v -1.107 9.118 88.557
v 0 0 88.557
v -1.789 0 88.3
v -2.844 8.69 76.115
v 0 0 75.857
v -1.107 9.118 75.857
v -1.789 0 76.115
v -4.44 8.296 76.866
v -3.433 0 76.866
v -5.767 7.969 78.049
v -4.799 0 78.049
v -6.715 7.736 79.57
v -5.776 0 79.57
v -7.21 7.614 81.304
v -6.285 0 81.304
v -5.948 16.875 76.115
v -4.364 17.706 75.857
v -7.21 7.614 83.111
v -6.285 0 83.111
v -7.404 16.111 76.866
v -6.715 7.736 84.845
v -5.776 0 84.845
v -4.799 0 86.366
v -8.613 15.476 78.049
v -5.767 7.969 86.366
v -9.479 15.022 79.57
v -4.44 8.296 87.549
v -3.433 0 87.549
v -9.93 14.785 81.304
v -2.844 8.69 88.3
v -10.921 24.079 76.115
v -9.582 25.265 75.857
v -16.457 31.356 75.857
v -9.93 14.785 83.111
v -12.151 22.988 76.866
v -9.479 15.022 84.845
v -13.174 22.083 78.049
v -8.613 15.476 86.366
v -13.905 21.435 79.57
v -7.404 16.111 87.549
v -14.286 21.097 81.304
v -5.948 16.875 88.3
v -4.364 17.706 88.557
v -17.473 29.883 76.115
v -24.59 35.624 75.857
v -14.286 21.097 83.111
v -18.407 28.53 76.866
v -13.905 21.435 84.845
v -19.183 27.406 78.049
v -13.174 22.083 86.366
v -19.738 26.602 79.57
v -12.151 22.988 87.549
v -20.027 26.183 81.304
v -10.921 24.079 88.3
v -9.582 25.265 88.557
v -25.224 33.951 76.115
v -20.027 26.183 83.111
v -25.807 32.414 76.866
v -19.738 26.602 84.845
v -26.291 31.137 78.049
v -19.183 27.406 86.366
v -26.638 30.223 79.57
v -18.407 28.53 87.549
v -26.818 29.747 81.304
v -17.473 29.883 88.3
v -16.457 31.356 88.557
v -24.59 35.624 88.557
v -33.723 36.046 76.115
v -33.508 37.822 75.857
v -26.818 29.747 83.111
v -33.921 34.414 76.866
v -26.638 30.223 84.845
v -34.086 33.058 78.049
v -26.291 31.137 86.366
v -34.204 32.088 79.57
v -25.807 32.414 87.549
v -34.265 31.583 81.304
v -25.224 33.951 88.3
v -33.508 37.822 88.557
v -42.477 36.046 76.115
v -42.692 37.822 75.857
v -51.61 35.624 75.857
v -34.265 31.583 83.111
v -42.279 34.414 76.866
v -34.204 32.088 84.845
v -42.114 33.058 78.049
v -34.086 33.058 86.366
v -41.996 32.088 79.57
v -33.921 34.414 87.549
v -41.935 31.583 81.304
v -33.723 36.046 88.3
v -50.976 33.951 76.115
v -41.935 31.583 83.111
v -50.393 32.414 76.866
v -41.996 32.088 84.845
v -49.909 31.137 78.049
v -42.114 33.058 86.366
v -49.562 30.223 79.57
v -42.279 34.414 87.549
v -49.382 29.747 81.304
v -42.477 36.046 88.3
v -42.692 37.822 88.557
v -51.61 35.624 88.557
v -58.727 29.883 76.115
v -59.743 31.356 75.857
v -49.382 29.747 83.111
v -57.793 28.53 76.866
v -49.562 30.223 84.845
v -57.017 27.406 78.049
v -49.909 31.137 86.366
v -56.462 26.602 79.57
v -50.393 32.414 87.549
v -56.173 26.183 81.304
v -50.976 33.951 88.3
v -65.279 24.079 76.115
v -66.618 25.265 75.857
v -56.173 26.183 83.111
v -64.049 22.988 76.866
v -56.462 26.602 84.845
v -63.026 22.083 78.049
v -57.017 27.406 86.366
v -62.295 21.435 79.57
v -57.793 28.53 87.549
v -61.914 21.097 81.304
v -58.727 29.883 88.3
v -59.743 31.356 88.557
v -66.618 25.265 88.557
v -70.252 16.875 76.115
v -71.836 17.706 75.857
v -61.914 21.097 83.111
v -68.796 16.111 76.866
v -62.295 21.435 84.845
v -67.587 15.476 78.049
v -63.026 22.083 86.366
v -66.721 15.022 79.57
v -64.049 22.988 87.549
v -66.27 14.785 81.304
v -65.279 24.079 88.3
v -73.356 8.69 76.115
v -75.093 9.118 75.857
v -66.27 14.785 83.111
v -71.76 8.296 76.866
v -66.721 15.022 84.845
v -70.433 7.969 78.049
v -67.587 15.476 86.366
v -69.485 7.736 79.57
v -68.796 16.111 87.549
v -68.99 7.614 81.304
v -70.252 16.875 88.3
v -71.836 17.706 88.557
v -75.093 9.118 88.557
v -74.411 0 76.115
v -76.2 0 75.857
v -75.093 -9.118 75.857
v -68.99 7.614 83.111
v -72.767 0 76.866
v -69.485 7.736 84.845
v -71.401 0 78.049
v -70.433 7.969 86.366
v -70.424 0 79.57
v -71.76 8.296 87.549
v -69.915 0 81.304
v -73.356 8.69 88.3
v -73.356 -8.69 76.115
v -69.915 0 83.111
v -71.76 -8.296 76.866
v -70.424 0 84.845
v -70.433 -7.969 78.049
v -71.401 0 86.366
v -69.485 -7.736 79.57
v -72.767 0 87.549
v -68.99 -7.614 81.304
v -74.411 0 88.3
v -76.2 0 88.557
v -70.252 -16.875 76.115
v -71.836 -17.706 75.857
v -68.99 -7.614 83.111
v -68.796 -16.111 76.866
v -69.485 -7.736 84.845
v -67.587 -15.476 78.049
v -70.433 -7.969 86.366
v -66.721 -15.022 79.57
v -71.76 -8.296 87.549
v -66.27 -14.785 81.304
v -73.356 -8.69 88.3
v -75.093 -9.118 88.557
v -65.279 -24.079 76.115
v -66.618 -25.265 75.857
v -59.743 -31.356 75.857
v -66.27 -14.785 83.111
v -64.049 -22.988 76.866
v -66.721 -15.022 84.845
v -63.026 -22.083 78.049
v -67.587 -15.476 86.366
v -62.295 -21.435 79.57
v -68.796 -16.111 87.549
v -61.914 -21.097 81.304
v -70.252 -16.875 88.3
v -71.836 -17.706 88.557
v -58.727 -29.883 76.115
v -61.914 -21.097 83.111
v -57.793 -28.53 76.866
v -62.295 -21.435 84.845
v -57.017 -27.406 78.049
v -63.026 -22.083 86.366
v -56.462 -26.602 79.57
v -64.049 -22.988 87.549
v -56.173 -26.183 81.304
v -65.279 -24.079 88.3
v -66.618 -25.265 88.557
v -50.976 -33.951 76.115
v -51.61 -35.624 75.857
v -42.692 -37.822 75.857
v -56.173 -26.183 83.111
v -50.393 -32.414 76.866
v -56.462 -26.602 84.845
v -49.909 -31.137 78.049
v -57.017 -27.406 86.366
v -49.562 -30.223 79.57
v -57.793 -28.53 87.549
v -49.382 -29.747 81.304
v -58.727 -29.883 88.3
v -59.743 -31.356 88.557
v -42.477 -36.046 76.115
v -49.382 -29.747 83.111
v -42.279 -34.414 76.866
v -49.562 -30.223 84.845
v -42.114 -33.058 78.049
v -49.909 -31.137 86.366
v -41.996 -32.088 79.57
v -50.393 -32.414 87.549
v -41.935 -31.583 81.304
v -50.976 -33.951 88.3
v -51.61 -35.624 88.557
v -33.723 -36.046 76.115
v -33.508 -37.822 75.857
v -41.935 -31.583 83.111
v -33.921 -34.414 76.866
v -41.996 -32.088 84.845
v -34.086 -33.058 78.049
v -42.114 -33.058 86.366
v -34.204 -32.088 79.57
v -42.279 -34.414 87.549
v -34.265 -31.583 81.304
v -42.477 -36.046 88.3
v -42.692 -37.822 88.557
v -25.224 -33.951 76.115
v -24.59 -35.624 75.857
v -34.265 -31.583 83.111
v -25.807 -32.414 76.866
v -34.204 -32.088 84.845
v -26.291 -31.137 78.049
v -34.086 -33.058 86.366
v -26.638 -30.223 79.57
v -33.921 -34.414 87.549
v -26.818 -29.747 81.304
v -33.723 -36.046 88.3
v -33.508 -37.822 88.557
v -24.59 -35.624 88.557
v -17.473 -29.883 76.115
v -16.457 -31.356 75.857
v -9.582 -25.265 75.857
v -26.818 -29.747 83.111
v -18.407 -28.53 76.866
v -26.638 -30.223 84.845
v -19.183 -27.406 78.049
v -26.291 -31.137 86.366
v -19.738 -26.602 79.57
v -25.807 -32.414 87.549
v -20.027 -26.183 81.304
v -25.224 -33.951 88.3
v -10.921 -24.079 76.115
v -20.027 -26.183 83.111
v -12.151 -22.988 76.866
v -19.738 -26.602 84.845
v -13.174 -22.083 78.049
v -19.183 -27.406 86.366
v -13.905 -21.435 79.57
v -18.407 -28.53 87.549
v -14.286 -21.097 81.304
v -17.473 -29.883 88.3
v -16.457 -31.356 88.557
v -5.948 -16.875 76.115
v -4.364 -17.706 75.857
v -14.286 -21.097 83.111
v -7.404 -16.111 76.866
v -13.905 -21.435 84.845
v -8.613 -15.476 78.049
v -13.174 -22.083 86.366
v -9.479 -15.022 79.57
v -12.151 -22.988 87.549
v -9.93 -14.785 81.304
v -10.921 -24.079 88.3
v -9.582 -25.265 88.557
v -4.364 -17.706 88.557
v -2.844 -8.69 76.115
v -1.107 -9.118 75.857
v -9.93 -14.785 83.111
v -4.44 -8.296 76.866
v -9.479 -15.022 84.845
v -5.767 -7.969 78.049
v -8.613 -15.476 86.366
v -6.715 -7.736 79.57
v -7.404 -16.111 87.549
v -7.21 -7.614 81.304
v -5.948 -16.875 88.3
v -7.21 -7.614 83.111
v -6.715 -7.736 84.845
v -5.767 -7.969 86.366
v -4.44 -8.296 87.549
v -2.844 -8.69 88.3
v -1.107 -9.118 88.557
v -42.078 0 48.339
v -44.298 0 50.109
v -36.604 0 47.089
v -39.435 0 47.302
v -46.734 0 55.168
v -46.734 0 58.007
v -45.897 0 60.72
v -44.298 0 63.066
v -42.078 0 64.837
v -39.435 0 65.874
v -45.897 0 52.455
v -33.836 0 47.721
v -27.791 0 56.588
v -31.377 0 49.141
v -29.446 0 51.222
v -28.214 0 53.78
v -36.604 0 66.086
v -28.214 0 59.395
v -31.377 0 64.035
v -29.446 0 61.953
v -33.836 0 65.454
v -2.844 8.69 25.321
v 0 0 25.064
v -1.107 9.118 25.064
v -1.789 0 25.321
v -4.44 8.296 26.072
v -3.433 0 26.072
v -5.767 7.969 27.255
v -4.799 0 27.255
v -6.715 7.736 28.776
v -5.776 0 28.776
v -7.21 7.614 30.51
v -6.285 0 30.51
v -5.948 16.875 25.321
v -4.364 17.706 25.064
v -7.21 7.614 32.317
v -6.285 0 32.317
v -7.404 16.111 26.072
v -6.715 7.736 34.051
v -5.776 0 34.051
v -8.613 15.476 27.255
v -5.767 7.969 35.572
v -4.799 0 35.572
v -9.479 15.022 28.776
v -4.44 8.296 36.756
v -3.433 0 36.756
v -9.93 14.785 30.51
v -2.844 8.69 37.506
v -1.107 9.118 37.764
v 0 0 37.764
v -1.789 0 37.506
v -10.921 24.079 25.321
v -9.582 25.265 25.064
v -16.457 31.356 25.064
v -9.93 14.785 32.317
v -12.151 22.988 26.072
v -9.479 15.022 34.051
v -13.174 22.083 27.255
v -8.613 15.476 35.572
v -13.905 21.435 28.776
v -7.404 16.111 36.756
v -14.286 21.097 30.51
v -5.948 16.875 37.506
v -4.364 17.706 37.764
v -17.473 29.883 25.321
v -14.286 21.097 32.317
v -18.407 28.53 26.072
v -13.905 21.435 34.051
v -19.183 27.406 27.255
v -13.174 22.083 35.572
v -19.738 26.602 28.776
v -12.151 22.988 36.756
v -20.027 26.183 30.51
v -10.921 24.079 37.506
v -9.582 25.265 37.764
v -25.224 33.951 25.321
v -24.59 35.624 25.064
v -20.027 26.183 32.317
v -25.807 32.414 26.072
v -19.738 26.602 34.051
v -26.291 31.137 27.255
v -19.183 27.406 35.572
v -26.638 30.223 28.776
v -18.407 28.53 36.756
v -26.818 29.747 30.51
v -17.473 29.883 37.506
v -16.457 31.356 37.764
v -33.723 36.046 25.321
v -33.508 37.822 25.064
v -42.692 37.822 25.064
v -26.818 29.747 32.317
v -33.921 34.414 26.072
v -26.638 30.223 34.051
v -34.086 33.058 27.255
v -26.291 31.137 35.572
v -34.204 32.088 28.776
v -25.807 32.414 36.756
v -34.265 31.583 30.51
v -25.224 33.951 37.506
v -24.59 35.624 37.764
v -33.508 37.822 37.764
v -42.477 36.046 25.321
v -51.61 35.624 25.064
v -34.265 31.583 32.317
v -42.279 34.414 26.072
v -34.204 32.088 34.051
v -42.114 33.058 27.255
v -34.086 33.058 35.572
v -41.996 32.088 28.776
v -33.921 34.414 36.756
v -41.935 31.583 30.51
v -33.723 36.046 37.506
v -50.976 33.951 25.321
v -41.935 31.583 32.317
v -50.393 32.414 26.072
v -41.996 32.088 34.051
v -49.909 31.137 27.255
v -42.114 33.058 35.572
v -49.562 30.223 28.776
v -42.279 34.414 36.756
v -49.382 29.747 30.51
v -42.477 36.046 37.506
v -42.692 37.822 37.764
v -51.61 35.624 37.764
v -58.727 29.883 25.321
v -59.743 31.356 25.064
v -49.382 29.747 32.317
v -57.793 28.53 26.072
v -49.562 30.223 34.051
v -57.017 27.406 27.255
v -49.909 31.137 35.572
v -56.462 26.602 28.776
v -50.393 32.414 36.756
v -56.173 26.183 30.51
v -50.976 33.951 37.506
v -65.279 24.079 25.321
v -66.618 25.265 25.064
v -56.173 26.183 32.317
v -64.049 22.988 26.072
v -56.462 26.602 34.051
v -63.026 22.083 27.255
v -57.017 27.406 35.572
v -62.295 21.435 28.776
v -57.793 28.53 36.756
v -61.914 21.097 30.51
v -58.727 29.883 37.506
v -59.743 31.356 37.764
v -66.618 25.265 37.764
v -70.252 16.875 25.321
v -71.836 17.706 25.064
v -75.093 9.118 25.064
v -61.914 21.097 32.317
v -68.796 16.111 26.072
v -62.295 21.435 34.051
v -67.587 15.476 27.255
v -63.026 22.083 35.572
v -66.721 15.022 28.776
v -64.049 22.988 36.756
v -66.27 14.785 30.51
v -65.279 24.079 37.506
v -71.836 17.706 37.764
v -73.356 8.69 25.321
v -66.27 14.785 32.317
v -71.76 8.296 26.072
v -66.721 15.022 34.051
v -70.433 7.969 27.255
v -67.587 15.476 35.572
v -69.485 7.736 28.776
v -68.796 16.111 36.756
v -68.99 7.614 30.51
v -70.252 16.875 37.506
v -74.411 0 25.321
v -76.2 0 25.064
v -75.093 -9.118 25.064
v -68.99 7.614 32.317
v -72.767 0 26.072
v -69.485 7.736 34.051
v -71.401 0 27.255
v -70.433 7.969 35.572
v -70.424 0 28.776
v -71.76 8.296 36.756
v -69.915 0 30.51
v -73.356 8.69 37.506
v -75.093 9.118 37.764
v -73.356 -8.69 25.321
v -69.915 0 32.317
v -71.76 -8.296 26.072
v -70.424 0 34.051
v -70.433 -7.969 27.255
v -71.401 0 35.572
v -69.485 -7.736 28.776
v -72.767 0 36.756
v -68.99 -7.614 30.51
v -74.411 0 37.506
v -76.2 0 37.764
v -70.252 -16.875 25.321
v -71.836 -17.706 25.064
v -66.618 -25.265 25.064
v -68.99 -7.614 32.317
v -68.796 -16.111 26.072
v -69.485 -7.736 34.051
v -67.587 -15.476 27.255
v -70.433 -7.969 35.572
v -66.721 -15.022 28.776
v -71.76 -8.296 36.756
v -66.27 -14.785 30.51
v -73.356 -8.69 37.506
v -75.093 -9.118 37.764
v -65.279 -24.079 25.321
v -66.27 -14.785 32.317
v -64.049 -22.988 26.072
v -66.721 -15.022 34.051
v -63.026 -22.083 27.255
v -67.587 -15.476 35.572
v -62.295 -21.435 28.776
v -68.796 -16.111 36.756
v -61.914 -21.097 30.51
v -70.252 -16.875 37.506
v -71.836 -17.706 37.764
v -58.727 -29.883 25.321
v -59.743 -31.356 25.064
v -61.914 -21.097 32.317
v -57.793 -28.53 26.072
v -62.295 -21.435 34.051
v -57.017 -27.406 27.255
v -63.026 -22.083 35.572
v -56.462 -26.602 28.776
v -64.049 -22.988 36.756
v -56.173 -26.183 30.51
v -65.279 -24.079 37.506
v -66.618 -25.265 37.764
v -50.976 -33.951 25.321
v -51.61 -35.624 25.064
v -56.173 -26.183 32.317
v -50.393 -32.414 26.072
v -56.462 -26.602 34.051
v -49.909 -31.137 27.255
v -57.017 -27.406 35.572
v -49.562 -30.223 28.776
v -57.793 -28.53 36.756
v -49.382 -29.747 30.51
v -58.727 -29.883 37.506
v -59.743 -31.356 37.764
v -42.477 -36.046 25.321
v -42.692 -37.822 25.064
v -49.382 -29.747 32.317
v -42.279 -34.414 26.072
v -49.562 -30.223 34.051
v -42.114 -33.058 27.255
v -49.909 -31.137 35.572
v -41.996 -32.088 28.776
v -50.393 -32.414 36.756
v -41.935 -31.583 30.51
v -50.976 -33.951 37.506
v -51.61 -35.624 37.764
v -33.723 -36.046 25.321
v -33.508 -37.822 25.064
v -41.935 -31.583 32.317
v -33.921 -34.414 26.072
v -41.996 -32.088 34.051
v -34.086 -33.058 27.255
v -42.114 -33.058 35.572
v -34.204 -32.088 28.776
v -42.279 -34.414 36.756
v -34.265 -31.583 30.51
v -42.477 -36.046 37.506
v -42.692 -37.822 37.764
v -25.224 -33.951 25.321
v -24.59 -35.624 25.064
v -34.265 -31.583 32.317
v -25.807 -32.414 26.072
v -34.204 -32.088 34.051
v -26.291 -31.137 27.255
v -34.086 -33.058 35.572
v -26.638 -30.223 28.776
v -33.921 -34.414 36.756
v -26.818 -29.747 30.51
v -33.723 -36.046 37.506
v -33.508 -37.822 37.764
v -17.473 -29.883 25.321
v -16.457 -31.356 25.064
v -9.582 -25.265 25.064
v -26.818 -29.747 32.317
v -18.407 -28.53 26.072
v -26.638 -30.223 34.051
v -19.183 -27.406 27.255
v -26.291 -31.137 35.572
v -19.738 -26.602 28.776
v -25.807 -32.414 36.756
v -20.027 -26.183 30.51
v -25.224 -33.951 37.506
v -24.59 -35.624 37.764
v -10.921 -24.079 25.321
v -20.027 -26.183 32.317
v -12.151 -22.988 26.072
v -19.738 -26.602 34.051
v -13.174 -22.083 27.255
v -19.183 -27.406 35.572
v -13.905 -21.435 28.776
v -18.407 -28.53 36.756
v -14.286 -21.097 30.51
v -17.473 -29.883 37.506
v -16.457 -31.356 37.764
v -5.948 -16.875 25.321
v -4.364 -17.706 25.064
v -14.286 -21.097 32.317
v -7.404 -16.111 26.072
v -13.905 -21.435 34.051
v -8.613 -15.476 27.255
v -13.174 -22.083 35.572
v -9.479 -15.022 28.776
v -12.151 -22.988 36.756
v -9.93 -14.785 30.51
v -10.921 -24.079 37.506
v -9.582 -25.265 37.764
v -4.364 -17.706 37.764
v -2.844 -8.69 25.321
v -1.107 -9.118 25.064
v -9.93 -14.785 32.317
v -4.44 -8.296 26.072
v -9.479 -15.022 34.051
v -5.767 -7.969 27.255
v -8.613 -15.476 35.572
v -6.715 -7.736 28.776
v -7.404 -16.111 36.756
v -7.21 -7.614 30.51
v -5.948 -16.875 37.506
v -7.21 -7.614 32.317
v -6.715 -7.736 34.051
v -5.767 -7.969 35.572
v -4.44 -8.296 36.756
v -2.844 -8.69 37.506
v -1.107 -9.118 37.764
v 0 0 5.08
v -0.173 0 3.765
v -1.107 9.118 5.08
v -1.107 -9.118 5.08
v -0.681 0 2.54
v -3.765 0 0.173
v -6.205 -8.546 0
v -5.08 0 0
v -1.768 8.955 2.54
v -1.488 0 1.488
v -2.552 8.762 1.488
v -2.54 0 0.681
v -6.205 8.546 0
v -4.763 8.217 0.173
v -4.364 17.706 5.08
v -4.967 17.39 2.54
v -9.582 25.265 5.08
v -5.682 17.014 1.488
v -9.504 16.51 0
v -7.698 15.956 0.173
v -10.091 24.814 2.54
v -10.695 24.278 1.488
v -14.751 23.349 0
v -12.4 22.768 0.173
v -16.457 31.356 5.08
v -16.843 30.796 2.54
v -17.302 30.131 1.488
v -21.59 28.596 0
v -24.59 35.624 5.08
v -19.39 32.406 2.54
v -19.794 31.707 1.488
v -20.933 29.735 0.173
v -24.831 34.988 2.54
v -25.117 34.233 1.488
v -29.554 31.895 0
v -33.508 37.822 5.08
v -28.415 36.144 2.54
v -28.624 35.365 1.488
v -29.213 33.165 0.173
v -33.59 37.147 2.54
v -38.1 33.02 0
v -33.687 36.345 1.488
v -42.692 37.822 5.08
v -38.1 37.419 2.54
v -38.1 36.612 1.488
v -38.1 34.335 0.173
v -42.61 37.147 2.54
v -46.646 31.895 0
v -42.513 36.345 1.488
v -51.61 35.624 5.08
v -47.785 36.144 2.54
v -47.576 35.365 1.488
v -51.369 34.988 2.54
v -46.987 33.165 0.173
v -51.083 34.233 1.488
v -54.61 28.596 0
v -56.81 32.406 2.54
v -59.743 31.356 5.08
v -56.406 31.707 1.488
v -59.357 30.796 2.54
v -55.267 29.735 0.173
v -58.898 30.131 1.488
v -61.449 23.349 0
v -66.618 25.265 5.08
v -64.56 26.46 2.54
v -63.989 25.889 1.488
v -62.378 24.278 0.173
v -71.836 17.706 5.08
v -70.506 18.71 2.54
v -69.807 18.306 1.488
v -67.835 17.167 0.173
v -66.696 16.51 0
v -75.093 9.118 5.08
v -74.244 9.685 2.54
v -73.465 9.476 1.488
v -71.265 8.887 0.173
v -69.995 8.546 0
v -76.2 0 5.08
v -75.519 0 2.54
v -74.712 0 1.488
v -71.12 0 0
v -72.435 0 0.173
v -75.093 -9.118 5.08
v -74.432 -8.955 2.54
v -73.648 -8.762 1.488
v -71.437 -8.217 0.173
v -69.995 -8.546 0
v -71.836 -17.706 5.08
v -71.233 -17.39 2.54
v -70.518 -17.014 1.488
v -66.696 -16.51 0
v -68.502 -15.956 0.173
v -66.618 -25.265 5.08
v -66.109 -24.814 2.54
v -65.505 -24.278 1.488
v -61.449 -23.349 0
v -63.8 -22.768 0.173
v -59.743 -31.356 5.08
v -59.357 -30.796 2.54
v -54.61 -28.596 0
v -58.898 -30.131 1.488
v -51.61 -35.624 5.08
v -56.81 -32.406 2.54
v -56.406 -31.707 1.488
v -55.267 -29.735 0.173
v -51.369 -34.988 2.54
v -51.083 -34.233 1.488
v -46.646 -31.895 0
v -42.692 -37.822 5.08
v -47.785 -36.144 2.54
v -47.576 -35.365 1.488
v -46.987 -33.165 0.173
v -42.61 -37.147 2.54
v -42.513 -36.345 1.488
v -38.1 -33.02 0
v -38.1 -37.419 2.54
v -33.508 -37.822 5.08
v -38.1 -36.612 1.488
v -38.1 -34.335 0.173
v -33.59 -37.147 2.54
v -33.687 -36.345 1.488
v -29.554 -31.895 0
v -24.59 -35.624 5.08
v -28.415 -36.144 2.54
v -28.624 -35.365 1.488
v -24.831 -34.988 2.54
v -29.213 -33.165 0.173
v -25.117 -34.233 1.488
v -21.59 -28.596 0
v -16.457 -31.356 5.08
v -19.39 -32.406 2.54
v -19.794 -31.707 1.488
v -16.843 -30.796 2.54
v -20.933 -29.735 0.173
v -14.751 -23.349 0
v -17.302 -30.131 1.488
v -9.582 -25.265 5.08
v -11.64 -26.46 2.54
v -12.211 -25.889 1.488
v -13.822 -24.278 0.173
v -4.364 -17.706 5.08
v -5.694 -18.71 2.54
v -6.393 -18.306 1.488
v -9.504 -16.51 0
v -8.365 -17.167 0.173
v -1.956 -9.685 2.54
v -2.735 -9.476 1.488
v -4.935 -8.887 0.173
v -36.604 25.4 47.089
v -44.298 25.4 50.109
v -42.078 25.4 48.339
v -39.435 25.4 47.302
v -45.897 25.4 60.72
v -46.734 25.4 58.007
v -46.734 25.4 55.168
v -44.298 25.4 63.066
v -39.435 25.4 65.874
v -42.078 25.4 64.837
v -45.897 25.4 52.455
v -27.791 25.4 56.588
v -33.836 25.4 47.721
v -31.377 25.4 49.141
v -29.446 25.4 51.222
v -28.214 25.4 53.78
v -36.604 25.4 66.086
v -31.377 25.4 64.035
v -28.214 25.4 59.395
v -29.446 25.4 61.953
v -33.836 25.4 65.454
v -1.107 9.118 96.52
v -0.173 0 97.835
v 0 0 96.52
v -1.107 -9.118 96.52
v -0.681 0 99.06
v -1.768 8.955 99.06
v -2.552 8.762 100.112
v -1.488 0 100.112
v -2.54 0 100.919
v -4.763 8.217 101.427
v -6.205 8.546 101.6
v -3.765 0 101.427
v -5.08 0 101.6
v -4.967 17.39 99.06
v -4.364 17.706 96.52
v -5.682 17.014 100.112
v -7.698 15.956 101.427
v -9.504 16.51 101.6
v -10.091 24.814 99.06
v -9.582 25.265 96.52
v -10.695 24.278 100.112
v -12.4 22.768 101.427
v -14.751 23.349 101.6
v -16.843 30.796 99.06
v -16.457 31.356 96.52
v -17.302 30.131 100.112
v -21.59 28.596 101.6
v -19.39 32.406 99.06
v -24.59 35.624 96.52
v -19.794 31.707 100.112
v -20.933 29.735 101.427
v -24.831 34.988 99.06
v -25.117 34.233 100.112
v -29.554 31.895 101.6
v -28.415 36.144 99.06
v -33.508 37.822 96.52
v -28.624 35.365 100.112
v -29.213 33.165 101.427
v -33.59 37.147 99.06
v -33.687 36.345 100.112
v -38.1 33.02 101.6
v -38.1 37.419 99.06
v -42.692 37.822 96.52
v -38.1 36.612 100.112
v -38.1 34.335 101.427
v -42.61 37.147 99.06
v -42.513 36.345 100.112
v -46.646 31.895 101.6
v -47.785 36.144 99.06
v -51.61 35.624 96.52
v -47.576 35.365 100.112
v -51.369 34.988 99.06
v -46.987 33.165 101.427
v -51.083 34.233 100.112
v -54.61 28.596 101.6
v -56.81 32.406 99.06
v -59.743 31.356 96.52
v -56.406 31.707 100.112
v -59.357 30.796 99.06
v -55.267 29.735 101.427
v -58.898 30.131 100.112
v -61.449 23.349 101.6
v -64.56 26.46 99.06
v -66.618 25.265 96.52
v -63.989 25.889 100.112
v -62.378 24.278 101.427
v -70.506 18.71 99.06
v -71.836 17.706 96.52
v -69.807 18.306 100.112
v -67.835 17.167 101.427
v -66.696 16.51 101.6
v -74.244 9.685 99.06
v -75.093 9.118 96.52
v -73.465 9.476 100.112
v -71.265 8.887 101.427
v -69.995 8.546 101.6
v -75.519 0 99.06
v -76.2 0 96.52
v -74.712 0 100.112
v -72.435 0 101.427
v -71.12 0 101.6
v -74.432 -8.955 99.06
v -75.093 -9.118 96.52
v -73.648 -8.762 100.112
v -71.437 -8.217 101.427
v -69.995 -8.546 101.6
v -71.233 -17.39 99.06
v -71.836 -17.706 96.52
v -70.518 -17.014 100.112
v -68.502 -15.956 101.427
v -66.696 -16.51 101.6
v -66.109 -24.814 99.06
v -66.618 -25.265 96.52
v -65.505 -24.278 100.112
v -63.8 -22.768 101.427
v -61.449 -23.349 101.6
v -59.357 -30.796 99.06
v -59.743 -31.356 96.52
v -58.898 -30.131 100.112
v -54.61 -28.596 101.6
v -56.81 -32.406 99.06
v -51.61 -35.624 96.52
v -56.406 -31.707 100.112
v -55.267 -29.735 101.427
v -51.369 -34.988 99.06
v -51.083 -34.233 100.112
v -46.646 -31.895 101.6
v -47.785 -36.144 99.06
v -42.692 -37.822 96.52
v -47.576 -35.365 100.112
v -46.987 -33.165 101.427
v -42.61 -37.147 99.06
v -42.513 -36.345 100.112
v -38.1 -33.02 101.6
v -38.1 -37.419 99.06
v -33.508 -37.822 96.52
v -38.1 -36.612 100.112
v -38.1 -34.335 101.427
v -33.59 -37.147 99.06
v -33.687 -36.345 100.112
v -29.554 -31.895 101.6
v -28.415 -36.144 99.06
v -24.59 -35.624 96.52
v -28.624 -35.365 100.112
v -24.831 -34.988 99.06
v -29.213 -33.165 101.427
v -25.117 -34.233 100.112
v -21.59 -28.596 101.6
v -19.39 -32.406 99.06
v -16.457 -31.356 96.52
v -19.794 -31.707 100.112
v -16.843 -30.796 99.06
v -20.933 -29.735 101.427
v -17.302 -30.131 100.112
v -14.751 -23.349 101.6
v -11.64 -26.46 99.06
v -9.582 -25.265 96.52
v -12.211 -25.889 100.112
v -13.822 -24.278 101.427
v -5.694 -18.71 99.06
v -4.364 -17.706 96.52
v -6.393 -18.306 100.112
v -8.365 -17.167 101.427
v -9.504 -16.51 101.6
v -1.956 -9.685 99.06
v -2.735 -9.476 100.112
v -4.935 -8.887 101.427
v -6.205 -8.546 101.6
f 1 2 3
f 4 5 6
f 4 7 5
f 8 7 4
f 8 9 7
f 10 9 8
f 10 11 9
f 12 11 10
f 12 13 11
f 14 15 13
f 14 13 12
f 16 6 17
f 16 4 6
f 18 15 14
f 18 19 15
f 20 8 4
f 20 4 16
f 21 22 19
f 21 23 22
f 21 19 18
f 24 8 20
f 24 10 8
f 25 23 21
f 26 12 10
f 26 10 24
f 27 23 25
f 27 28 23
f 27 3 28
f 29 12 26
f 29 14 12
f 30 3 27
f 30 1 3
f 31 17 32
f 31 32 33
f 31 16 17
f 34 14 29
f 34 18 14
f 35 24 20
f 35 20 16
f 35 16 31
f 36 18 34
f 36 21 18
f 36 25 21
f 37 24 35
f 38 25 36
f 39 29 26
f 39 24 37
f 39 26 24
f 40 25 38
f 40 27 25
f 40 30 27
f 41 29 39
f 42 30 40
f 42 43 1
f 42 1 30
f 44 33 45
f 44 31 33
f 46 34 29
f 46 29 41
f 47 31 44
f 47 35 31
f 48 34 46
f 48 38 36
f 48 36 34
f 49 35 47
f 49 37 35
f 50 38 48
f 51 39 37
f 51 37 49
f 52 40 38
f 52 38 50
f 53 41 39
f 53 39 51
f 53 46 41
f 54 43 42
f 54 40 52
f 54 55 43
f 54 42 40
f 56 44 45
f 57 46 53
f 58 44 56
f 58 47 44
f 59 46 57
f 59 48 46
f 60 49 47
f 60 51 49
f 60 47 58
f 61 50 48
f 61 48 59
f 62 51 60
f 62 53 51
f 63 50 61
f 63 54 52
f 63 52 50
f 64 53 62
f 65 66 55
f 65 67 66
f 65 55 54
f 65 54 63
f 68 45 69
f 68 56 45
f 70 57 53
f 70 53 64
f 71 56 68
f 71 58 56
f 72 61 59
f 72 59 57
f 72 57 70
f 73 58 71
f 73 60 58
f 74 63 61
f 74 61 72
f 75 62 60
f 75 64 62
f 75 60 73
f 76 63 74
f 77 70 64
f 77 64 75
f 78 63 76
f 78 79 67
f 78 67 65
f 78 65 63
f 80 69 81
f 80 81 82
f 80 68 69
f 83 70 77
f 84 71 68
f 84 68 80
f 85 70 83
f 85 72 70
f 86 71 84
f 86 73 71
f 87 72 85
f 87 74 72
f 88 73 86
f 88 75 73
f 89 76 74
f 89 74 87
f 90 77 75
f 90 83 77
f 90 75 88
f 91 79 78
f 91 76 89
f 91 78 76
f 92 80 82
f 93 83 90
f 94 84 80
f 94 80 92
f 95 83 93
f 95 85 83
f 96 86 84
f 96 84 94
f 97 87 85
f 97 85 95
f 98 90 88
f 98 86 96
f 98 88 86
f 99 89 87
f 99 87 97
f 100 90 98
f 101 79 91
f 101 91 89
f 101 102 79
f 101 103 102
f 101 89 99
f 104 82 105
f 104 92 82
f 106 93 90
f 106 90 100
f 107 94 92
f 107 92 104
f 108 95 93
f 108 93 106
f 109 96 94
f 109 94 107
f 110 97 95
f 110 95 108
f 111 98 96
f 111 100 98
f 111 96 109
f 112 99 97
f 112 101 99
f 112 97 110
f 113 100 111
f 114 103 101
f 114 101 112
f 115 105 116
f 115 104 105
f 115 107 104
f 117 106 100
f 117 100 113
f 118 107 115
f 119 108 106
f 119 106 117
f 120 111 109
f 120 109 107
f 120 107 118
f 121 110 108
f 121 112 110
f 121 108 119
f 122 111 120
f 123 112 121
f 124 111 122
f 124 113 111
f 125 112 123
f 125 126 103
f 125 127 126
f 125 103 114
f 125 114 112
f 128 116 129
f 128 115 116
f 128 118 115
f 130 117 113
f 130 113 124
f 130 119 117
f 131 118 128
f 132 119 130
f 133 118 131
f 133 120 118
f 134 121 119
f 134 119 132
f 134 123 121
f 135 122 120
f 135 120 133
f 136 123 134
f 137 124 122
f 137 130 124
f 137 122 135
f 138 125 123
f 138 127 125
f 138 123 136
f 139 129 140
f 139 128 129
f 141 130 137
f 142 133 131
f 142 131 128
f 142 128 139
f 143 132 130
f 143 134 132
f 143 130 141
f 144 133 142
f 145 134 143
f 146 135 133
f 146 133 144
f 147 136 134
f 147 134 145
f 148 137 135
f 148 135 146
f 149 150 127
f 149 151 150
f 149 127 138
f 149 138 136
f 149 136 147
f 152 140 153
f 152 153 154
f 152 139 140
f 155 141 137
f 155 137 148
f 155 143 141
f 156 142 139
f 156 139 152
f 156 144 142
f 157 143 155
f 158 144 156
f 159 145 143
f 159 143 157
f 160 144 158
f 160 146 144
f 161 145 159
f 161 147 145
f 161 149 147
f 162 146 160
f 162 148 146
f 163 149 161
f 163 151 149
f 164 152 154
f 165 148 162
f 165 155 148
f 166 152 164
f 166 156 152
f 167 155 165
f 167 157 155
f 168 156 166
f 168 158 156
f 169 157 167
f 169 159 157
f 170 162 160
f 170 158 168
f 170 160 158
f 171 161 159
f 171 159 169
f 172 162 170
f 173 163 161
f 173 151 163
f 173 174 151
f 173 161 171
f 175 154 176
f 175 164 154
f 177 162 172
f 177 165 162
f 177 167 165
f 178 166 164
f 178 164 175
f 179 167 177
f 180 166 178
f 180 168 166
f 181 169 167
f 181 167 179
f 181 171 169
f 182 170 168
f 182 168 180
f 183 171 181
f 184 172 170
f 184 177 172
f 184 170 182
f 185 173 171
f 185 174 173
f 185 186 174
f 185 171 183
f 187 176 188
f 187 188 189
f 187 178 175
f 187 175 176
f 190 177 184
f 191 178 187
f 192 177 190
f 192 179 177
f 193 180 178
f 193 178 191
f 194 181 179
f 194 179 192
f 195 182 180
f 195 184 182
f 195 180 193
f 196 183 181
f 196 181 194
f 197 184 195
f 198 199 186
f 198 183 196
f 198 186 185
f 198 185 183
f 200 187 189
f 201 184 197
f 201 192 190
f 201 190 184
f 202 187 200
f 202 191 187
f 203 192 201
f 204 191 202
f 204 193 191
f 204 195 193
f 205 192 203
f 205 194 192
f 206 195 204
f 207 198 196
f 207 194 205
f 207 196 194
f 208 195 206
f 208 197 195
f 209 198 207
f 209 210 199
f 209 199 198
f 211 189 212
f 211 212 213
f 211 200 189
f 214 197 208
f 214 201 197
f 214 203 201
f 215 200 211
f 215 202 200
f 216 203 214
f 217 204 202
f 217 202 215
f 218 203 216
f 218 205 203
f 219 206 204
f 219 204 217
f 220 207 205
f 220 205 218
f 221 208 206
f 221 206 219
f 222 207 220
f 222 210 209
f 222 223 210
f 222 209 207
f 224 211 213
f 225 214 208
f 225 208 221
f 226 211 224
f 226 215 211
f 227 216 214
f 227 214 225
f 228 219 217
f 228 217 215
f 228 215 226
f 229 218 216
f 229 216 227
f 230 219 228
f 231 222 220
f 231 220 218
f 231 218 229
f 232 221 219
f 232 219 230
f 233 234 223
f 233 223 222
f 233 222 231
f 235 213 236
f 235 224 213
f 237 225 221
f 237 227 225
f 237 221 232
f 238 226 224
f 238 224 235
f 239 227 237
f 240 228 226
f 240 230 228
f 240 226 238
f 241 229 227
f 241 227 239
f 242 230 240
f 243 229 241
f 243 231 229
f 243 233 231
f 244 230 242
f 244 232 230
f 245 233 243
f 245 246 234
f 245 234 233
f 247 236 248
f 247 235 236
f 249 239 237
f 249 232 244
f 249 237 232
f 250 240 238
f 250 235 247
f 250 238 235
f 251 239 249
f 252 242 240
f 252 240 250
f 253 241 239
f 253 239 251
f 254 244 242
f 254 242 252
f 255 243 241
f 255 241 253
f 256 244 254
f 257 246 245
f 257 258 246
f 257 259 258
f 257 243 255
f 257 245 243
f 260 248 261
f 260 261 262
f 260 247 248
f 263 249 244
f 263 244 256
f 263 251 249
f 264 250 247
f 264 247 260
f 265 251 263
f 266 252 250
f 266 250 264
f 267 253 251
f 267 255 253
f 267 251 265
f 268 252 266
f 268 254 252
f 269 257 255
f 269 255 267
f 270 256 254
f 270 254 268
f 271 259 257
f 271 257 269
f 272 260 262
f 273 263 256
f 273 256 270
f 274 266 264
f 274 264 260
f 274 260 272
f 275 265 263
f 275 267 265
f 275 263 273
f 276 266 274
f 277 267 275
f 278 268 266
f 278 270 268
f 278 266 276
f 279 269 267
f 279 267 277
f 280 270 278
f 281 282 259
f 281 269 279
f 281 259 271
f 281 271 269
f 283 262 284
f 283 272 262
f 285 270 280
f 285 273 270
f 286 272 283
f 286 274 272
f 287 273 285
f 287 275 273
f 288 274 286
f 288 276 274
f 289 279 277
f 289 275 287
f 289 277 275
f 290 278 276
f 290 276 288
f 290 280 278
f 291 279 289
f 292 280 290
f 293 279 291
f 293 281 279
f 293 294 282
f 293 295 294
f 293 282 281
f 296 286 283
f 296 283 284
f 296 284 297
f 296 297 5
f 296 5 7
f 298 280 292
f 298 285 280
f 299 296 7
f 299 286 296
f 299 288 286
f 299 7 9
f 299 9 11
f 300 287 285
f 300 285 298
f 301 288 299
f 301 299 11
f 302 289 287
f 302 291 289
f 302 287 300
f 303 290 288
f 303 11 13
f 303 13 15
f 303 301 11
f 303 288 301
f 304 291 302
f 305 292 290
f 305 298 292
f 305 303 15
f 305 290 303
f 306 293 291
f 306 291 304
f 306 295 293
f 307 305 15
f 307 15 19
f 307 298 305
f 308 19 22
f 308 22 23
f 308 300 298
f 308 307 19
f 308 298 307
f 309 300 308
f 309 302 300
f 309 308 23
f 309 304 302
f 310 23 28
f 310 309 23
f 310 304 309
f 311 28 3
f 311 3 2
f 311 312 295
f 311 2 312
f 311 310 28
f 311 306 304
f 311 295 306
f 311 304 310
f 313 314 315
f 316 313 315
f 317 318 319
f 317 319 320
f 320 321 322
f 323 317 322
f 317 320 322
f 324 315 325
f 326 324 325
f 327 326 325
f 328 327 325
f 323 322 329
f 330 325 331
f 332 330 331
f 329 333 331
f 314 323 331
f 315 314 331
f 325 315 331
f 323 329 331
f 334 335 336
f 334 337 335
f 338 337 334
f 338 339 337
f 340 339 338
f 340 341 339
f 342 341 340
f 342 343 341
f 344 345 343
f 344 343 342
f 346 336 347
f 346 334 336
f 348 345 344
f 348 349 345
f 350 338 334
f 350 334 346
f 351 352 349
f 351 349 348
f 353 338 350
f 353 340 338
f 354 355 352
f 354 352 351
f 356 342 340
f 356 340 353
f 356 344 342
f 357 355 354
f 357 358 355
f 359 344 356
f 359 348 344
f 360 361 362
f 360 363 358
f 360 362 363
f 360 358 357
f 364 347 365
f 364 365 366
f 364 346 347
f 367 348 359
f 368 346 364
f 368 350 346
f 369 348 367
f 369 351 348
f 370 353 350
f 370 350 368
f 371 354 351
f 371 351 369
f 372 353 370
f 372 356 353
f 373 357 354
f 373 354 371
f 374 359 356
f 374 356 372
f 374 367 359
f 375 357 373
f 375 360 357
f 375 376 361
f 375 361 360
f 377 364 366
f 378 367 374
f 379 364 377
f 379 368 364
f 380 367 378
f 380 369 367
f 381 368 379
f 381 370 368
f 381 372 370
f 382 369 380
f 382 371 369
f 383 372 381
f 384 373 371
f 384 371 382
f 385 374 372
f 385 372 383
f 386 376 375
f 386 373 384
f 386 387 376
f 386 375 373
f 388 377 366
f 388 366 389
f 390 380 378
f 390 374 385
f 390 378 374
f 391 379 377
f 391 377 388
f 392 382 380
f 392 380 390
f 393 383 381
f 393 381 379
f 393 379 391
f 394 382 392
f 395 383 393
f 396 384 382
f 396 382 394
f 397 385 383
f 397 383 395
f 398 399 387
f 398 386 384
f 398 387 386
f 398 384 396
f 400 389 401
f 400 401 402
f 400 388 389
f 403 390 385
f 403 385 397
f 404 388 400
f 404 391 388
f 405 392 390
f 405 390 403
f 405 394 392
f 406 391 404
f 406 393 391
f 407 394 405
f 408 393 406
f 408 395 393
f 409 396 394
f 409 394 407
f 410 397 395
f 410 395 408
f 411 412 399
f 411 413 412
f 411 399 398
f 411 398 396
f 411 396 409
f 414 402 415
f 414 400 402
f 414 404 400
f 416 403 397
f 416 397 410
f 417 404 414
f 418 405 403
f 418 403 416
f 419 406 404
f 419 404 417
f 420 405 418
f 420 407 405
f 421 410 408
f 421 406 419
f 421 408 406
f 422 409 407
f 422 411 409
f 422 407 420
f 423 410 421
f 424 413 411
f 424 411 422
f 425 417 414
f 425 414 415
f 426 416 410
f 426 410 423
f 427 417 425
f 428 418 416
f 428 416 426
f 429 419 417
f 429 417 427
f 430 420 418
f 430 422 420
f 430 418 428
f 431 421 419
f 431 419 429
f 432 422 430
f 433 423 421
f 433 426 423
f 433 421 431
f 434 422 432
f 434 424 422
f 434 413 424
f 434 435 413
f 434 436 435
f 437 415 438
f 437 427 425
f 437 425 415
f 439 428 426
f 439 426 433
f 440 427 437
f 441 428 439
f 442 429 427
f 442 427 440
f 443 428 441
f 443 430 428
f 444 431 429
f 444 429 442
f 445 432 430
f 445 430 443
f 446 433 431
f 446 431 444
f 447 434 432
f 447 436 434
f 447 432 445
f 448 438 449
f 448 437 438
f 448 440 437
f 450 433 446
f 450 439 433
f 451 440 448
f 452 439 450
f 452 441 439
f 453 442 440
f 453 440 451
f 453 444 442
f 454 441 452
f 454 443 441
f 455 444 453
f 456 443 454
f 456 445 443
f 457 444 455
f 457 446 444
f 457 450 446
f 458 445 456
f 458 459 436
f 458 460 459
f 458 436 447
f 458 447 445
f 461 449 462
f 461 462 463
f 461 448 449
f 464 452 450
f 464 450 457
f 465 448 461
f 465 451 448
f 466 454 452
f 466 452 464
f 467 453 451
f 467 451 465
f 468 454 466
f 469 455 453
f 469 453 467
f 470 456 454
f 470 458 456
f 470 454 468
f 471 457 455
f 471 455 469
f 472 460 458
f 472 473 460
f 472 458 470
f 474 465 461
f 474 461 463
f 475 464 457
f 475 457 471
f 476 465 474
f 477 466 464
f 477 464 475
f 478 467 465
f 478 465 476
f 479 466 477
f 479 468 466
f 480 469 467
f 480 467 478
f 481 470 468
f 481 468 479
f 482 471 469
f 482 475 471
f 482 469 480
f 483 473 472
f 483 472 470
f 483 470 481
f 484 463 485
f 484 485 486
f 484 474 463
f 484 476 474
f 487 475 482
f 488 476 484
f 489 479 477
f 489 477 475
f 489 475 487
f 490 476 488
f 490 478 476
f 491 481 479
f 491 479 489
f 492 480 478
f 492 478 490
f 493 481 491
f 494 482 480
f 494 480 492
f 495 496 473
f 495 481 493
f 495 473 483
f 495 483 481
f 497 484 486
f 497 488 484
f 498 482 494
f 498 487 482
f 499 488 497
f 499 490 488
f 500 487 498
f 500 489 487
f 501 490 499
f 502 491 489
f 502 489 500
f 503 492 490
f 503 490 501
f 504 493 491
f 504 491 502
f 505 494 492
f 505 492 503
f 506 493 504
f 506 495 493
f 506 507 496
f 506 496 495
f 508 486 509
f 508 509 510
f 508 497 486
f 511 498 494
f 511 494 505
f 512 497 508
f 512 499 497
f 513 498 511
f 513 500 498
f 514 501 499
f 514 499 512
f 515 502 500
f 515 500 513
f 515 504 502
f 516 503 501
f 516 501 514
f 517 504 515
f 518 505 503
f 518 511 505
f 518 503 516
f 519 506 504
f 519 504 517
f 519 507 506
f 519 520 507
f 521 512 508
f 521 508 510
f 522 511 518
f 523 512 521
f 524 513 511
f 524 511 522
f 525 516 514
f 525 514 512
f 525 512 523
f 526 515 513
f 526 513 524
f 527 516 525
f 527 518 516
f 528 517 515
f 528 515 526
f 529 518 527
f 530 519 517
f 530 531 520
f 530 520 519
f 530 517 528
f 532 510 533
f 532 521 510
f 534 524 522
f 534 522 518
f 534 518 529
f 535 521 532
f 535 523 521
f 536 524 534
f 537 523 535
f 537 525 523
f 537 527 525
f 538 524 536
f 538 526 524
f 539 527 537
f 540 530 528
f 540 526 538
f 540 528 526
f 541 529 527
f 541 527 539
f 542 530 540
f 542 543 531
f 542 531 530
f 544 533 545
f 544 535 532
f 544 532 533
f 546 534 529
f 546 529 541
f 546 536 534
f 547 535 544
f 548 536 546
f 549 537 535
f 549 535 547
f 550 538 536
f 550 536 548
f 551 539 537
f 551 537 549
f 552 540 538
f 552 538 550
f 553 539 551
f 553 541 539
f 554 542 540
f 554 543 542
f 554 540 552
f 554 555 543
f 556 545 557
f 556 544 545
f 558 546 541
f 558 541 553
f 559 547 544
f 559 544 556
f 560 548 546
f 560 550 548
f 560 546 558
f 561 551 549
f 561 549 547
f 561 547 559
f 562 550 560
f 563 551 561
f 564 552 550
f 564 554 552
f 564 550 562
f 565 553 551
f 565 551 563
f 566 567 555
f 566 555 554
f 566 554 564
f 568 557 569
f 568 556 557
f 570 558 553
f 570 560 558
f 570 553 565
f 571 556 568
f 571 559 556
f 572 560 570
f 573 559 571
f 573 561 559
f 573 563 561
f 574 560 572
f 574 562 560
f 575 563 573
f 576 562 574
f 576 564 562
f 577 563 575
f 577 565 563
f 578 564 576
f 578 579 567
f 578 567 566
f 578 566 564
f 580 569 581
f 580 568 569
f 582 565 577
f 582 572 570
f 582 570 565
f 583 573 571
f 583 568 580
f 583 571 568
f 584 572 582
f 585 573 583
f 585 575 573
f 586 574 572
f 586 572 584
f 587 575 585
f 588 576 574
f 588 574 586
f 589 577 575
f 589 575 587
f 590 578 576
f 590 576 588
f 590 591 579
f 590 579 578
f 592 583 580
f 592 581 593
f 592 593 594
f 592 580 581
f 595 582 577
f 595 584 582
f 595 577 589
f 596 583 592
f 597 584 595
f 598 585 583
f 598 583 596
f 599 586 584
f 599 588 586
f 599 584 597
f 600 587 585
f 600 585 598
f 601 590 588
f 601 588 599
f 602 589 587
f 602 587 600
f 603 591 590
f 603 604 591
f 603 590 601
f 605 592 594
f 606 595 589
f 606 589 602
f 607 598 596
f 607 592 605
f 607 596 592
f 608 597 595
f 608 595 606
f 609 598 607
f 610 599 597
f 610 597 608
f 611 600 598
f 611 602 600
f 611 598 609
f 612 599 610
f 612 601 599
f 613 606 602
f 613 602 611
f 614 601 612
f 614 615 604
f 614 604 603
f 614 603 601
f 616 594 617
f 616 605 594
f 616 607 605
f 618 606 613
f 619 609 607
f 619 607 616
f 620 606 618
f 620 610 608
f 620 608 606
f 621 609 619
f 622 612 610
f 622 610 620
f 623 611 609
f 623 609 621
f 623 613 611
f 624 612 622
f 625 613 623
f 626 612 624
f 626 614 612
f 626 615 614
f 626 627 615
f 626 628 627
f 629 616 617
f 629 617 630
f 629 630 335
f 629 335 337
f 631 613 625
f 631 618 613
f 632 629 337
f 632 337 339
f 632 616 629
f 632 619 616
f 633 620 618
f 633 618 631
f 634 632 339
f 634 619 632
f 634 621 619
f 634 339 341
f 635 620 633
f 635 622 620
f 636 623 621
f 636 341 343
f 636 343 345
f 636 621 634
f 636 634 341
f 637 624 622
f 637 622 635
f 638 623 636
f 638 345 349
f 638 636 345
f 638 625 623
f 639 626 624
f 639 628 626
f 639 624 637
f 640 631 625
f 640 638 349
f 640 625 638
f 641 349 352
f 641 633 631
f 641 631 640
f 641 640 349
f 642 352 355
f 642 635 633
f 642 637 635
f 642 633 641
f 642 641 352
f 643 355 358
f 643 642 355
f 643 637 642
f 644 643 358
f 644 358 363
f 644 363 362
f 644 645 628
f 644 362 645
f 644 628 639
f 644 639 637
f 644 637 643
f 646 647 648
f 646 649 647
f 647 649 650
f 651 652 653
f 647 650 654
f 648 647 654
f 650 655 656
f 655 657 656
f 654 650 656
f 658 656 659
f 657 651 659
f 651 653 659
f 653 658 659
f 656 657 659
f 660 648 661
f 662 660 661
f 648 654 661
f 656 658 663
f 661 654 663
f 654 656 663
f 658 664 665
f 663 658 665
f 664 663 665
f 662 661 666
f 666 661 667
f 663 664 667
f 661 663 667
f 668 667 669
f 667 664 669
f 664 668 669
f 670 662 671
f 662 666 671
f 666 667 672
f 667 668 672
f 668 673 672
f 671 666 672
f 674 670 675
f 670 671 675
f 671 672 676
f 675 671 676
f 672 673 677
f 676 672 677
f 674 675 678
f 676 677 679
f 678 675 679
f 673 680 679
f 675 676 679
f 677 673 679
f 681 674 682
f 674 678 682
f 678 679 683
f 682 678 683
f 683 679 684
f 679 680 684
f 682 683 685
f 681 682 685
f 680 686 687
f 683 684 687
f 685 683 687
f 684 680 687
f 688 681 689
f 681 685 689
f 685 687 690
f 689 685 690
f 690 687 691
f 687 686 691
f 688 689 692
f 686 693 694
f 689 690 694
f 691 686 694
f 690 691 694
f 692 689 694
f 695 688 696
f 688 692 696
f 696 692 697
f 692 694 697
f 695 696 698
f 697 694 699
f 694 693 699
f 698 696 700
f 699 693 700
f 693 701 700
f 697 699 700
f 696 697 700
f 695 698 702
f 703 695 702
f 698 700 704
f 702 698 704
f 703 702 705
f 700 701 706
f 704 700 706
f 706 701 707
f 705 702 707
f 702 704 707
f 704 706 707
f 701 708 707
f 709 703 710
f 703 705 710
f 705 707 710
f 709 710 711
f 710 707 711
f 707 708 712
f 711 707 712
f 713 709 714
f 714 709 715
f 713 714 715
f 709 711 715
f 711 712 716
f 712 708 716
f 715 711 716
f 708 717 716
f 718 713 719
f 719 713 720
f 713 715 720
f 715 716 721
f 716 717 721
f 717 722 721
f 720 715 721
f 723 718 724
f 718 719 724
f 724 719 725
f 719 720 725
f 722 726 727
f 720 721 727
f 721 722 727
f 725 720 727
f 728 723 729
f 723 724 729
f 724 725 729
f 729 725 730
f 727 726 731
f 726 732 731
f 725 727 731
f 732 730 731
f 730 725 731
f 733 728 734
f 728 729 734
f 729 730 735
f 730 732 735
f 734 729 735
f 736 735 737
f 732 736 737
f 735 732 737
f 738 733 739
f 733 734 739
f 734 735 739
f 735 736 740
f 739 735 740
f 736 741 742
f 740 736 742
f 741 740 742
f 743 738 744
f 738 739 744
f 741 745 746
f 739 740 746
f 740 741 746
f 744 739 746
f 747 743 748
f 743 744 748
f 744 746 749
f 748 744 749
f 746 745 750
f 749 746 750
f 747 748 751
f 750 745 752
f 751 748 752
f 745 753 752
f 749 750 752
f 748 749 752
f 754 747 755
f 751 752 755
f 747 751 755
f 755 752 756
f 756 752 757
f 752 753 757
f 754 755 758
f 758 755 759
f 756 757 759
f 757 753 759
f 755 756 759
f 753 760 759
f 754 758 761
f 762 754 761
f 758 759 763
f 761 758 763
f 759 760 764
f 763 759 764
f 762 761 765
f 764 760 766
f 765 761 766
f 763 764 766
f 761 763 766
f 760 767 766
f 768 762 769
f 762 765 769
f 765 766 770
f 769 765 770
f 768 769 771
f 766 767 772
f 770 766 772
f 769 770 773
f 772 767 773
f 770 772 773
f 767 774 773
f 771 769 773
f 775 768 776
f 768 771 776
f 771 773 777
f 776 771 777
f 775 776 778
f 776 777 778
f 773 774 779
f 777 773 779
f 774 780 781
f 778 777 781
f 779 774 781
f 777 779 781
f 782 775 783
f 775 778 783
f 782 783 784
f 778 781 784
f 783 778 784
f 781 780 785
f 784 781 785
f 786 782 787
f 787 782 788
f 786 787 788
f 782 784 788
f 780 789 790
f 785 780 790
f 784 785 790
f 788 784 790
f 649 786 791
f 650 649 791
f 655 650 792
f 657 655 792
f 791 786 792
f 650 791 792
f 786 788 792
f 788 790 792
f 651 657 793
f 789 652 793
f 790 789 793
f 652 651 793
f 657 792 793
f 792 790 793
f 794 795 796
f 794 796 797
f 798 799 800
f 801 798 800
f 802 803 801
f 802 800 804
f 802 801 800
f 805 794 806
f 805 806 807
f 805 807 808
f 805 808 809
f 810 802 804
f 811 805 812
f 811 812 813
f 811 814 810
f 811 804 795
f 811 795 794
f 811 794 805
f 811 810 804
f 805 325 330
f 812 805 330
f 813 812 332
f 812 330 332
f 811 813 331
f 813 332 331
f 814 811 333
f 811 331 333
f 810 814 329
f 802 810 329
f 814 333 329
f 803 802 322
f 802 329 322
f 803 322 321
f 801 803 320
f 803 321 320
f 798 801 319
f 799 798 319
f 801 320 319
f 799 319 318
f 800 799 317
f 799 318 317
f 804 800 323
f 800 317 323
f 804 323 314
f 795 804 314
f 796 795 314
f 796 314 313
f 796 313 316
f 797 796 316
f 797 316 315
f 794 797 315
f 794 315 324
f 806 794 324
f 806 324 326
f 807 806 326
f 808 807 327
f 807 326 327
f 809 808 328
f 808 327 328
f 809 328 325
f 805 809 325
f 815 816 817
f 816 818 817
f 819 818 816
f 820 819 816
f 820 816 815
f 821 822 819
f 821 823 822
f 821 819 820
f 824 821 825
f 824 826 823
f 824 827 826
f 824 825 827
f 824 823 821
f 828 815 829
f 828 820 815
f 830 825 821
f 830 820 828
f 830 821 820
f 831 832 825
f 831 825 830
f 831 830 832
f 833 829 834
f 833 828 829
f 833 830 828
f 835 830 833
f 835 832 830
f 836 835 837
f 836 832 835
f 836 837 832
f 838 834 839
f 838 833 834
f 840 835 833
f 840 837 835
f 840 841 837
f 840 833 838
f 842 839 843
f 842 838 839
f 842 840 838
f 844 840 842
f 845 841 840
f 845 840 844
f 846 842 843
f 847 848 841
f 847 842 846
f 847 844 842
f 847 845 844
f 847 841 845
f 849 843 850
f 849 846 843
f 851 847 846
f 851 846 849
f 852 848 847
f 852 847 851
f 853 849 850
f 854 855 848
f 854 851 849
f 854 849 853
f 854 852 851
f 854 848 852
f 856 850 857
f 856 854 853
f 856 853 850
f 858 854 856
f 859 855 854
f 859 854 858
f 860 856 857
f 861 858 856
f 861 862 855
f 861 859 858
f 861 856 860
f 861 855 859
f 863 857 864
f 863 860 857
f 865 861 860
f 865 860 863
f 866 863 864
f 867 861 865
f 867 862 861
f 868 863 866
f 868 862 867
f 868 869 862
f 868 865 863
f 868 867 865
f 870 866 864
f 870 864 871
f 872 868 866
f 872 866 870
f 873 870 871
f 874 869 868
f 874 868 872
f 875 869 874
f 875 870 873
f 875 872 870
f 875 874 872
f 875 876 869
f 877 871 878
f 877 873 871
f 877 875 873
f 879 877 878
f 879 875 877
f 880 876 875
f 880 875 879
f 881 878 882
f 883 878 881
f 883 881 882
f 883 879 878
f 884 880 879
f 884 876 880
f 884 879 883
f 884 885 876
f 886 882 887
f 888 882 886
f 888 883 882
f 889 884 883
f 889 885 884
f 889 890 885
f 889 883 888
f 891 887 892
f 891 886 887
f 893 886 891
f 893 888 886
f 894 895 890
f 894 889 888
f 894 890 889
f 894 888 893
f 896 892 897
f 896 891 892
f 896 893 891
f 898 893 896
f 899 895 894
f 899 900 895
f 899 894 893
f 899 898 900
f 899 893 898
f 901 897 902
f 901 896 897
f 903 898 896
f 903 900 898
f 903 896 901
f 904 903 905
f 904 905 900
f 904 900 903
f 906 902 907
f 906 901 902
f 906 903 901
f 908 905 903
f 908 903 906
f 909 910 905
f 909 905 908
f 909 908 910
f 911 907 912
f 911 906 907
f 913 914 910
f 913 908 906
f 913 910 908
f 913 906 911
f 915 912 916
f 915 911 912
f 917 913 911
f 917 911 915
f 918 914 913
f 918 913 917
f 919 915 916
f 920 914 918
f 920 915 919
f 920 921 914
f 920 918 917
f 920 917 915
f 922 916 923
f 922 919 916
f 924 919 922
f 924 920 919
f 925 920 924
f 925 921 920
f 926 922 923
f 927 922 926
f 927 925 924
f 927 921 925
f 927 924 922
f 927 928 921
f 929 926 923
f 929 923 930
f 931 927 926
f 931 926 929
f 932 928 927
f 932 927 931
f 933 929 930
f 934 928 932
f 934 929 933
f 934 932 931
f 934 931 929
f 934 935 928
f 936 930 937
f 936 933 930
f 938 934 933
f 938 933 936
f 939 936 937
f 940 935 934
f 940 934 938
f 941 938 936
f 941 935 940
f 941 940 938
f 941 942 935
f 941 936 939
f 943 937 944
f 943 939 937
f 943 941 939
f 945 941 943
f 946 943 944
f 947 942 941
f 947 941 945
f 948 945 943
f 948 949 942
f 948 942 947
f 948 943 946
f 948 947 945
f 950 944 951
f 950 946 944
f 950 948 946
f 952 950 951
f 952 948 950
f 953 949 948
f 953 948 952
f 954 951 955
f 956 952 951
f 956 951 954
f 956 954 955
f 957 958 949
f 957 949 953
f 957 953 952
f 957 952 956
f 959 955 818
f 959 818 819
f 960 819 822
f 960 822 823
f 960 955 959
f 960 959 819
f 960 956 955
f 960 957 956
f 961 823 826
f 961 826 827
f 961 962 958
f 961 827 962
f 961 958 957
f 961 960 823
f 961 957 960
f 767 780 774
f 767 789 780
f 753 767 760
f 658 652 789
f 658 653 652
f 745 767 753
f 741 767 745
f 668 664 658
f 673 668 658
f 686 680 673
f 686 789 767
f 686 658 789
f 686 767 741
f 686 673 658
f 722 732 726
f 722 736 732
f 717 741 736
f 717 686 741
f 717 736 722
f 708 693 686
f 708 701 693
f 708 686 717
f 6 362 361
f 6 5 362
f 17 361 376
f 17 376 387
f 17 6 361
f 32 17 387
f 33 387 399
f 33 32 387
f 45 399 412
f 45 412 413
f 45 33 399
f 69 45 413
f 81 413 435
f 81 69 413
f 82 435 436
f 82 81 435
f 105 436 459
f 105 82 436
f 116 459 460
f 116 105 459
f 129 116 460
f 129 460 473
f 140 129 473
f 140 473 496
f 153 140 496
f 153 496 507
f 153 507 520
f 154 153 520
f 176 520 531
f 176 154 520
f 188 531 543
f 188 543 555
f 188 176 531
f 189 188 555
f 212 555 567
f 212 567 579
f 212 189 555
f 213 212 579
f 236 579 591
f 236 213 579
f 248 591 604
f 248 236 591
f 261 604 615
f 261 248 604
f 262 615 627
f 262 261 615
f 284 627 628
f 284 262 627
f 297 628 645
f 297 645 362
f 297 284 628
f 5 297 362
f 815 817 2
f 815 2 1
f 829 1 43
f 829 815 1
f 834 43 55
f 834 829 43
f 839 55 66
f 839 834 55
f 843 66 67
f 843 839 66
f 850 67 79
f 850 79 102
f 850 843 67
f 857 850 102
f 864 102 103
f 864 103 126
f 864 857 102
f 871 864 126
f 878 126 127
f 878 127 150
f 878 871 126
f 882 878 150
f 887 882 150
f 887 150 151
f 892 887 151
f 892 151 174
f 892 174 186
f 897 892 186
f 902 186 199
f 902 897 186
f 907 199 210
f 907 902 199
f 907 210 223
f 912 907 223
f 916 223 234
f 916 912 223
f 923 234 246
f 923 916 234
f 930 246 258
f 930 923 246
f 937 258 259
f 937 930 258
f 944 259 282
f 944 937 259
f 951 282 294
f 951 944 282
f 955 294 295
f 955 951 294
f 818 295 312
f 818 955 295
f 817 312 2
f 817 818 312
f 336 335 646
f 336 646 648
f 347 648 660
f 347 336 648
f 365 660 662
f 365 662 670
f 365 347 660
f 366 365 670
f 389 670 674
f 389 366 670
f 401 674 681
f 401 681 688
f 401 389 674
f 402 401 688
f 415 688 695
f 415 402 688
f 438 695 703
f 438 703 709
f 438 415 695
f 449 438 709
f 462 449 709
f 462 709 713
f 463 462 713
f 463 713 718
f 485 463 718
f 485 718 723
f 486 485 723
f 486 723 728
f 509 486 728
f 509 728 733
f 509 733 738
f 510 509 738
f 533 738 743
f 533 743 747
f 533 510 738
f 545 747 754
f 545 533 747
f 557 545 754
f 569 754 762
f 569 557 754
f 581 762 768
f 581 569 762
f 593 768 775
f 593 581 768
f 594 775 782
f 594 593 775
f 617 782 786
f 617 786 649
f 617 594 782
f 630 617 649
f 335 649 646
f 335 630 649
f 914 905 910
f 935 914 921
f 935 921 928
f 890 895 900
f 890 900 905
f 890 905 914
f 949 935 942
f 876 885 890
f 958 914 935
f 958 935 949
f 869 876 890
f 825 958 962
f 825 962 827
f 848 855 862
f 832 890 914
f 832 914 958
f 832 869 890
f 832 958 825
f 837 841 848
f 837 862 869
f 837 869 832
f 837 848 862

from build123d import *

# Parameters (mm, degrees)
F2_R     = 9.525
F3_DEPTH = 25.4
F4_DEPTH = 25.4
F5_R     = 5.08
F6_R     = 5.08


with BuildPart() as f1:
    # F0 (on Front) → F1 (revolve)
    with BuildSketch(Plane.XZ):
        with BuildLine():
            Line((-38.1, 0), (0, 0))
            Line((0, 0), (0, 25.063555))
            ThreePointArc((0, 25.063555), (-6.35, 31.413555), (0, 37.763555))
            Line((0, 37.763555), (0, 75.857493))
            ThreePointArc((0, 75.857493), (-6.35, 82.207493), (0, 88.557493))
            Line((0, 88.557493), (0, 101.6))
            Line((0, 101.6), (-38.1, 101.6))
            Line((-38.1, 101.6), (-38.1, 0))
        make_face()
    revolve(axis=Axis((-38.1, 0, 50.8), (0, 0, 1)))

    # F2 (on Front) → F3 (cut)
    with BuildSketch(Plane.XZ):
        with Locations((-37.315723, 56.587745)):
            Circle(F2_R)
    extrude(amount=-F3_DEPTH, mode=Mode.SUBTRACT)

    # F2 (on Front) → F4 (cut)
    with BuildSketch(Plane.XZ):
        with Locations((-37.315723, 56.587745)):
            Circle(F2_R)
    extrude(amount=-F4_DEPTH, mode=Mode.SUBTRACT)

    # F5
    f5_edges = [f1.edges().sort_by_distance(p)[0] for p in [
        (-76.2, 0, 101.6),
    ]]
    fillet(f5_edges, radius=F5_R)

    # F6
    f6_edges = [f1.edges().sort_by_distance(p)[0] for p in [
        (-76.2, 0, 0),
    ]]
    fillet(f6_edges, radius=F6_R)


solid = f1.part
